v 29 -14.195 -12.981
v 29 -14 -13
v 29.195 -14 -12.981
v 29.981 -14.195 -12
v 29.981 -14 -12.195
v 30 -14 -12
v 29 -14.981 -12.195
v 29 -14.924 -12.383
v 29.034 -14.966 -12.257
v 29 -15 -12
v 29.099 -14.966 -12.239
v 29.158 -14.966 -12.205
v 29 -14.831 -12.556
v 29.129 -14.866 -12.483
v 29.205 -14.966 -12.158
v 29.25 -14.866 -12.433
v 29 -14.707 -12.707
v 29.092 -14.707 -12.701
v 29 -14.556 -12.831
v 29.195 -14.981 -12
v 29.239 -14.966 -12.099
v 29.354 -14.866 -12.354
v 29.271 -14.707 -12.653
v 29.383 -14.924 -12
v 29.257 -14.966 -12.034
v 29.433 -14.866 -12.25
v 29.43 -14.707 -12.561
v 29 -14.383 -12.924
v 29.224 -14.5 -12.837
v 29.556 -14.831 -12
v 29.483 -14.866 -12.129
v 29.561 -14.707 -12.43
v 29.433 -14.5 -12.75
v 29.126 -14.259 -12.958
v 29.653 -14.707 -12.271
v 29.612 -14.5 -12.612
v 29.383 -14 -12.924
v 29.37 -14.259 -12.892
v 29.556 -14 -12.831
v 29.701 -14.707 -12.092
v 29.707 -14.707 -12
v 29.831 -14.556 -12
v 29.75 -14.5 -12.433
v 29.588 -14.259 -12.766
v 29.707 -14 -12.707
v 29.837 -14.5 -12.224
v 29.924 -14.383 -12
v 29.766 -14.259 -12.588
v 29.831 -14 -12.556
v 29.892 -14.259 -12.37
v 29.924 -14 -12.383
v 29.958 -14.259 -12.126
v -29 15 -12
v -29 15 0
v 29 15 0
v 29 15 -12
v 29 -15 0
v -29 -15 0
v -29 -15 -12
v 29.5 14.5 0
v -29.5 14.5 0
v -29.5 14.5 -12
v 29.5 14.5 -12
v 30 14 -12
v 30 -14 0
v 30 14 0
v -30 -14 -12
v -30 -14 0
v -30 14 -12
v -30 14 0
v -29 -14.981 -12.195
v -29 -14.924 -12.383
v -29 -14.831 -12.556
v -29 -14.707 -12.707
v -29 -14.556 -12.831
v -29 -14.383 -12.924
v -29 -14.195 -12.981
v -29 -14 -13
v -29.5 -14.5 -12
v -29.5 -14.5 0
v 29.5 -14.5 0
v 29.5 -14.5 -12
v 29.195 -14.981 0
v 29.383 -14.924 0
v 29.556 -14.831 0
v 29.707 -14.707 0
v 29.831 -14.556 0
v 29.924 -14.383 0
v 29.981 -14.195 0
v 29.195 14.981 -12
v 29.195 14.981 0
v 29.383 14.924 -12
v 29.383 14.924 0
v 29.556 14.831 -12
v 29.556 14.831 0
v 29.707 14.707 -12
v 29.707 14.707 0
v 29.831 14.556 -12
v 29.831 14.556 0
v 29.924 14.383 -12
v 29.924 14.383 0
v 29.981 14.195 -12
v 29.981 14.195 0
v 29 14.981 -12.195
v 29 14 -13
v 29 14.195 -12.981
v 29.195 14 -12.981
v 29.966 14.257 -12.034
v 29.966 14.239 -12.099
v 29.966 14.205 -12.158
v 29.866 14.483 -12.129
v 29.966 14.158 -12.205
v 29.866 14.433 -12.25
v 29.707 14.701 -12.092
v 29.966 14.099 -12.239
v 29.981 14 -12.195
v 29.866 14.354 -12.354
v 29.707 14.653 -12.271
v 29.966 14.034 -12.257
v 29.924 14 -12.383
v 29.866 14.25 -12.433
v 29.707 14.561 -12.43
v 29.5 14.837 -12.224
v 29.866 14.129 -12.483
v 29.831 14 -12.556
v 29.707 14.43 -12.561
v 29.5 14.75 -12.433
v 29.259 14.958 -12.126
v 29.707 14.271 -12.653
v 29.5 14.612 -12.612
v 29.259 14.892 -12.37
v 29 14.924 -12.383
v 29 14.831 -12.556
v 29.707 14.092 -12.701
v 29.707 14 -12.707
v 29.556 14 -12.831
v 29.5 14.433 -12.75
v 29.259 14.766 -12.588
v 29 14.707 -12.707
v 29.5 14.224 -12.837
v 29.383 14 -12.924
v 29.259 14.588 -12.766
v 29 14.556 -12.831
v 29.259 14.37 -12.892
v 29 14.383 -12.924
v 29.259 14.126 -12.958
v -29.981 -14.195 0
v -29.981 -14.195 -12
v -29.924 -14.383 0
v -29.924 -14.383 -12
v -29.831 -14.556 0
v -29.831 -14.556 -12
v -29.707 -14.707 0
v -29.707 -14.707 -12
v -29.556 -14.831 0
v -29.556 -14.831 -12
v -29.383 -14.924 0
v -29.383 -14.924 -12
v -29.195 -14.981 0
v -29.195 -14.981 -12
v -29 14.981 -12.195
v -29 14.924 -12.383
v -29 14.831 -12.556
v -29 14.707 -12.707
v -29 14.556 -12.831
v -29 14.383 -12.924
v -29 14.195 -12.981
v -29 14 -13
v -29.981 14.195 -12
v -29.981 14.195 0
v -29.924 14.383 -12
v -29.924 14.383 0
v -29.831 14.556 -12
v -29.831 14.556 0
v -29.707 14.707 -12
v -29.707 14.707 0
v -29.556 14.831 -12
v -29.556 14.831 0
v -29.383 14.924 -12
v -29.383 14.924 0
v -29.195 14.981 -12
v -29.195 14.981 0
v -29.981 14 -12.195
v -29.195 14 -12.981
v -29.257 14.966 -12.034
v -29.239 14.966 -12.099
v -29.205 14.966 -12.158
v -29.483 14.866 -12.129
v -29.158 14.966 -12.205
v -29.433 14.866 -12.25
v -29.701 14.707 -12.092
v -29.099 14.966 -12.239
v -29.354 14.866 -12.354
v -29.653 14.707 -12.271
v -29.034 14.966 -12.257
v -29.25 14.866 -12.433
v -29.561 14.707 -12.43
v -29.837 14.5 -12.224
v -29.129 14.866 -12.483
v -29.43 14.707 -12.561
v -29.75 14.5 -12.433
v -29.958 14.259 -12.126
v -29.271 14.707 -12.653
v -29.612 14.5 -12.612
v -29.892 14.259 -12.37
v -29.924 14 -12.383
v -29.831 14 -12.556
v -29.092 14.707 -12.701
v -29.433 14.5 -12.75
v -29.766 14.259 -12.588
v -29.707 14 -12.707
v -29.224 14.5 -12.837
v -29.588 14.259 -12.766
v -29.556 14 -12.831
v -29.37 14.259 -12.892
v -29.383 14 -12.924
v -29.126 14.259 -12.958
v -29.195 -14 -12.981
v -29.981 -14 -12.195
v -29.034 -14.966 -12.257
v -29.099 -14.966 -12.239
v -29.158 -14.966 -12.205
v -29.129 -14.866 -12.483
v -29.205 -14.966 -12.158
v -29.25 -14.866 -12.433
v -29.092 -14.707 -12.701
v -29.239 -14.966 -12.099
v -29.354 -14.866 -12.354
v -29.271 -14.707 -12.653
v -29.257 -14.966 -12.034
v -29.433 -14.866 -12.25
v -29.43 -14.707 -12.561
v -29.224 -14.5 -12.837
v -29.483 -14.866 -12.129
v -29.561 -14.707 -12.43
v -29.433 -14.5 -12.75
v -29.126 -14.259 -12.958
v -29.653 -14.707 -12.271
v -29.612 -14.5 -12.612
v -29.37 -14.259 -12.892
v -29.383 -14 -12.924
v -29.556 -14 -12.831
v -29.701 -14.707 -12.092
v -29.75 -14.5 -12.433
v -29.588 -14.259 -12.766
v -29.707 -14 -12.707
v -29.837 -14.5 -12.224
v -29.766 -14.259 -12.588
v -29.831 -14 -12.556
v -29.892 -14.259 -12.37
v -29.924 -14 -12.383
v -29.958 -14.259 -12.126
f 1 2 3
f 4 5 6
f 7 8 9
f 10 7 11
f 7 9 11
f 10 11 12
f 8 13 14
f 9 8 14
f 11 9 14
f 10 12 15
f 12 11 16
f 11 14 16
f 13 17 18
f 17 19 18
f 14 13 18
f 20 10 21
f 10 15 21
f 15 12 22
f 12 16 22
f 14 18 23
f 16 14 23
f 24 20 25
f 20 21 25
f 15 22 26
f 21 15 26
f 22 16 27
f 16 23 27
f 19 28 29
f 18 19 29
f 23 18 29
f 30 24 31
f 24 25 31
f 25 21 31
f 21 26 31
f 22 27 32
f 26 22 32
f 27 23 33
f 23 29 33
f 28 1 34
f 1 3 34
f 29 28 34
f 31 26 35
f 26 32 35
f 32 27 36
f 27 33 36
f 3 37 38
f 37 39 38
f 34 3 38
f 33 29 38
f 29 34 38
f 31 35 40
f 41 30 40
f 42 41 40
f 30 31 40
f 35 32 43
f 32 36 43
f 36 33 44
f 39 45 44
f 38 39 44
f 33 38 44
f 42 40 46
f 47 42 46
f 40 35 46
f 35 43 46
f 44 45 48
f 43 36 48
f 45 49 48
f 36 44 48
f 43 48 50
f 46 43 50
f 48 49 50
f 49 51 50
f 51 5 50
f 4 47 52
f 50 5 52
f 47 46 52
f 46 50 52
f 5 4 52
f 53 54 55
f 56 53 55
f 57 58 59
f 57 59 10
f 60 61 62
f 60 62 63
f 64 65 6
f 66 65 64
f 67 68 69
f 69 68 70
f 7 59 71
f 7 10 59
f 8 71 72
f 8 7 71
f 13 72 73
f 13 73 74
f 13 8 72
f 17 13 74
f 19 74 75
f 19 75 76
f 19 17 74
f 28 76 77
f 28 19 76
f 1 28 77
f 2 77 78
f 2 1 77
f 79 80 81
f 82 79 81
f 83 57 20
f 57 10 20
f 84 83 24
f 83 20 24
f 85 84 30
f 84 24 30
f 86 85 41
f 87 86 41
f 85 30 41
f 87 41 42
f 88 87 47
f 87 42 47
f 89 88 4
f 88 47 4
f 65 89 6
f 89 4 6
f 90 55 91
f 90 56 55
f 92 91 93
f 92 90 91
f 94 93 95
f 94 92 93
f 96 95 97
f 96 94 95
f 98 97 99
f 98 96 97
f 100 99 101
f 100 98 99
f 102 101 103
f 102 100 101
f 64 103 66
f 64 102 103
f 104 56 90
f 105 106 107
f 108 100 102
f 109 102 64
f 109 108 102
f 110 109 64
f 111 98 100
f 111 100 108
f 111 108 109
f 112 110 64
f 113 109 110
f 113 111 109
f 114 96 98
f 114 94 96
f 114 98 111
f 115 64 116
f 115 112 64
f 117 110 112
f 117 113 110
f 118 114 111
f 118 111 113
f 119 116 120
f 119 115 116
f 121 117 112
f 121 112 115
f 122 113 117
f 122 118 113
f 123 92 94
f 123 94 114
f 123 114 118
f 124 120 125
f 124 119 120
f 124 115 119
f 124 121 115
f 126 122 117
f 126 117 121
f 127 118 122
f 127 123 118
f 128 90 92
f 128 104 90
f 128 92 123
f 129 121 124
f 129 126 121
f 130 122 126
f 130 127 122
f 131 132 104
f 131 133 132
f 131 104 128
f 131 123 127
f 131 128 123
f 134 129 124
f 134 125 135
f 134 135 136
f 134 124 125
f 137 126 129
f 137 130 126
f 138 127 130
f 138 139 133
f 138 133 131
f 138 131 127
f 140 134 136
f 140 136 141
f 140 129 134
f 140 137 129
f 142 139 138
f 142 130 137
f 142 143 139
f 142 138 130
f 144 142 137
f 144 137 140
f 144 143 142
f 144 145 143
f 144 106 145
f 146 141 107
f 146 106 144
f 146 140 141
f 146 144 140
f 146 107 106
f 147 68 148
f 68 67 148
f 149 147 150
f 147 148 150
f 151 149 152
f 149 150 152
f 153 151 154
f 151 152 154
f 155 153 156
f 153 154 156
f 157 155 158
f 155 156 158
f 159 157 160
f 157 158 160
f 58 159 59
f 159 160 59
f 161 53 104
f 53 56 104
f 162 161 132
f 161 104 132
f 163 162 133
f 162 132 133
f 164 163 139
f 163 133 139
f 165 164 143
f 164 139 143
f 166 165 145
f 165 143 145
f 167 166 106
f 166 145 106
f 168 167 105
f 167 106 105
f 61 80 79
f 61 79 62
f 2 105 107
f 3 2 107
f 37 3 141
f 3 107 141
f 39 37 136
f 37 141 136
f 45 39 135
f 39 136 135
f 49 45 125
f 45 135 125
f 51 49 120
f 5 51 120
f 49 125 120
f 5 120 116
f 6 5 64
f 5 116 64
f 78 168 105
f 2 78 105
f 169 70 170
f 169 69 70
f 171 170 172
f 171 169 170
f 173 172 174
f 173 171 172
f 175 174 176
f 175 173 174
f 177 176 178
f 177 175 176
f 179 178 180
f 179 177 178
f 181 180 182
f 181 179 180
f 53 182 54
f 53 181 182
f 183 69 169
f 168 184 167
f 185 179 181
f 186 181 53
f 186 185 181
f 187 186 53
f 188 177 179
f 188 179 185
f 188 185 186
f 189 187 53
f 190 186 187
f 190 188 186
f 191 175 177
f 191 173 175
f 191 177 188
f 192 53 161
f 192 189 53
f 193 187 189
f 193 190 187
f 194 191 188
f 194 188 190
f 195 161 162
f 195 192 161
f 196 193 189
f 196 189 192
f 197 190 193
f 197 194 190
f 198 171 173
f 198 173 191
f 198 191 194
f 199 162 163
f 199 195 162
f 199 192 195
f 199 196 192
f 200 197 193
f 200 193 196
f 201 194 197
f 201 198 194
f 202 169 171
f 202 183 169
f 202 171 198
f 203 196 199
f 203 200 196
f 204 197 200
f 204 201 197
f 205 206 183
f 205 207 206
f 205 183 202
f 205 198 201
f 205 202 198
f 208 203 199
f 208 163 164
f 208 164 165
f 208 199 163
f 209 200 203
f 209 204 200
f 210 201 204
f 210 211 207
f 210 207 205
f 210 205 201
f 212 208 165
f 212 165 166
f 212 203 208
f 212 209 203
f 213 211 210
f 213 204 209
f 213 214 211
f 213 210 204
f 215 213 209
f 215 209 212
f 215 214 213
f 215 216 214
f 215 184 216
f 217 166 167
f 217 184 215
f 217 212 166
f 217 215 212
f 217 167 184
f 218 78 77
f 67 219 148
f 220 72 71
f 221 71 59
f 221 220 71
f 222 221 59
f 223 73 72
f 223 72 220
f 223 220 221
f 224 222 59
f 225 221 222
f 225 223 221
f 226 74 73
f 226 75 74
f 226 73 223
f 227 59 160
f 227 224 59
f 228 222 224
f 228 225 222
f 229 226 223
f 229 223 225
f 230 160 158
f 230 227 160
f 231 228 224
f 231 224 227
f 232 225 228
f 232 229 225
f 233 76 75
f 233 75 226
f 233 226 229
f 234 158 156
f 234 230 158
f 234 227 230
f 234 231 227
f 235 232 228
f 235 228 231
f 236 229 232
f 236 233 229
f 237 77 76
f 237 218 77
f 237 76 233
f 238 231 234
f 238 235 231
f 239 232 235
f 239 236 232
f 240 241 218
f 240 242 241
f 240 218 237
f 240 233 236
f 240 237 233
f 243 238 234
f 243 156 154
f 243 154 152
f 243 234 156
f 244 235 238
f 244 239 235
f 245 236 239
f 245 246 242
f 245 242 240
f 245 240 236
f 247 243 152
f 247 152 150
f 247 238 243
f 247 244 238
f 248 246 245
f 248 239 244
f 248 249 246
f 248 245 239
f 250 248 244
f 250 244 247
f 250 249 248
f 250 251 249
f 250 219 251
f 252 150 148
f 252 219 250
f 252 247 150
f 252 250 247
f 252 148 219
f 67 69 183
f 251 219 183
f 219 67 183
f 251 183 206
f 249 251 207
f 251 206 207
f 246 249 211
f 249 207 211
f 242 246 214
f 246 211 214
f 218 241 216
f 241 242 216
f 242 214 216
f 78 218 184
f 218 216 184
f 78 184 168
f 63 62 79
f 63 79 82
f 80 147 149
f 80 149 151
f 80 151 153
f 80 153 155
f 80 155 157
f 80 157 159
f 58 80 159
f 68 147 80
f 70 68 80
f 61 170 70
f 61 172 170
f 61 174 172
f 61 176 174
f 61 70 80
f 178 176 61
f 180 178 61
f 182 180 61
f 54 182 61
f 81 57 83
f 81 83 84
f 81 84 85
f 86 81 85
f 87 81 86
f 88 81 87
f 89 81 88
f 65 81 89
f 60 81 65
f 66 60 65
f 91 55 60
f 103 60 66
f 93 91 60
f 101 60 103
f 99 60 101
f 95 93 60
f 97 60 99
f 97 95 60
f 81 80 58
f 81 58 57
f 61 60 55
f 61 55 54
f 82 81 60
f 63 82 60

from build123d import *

# Parameters (mm, degrees)
F0_W     = 60
F0_H     = 30
F0_W_2   = 59
F0_H_2   = 29
F1_DEPTH = 13
F2_DEPTH = 12
F3_R     = 1


with BuildPart() as f1:
    # F0 (on Top) → F1 (new body)
    with BuildSketch(Plane.XY):
        Rectangle(F0_W, F0_H)
        Rectangle(F0_W_2, F0_H_2, mode=Mode.SUBTRACT)
        Rectangle(F0_W_2, F0_H_2)
    extrude(amount=-F1_DEPTH)

    # F0 (on Top) → F2 (cut)
    with BuildSketch(Plane.XY):
        Rectangle(F0_W_2, F0_H_2)
    extrude(amount=-F2_DEPTH, mode=Mode.SUBTRACT)

    # F3
    f3_edges = [f1.edges().sort_by_distance(p)[0] for p in [
        (-30, 0, -13),
        (-30, 15, -6.5),
        (0, 15, -13),
        (30, 15, -6.5),
        (30, 0, -13),
        (0, -15, -13),
        (30, -15, -6.5),
        (-30, -15, -6.5),
    ]]
    fillet(f3_edges, radius=F3_R)


solid = f1.part
